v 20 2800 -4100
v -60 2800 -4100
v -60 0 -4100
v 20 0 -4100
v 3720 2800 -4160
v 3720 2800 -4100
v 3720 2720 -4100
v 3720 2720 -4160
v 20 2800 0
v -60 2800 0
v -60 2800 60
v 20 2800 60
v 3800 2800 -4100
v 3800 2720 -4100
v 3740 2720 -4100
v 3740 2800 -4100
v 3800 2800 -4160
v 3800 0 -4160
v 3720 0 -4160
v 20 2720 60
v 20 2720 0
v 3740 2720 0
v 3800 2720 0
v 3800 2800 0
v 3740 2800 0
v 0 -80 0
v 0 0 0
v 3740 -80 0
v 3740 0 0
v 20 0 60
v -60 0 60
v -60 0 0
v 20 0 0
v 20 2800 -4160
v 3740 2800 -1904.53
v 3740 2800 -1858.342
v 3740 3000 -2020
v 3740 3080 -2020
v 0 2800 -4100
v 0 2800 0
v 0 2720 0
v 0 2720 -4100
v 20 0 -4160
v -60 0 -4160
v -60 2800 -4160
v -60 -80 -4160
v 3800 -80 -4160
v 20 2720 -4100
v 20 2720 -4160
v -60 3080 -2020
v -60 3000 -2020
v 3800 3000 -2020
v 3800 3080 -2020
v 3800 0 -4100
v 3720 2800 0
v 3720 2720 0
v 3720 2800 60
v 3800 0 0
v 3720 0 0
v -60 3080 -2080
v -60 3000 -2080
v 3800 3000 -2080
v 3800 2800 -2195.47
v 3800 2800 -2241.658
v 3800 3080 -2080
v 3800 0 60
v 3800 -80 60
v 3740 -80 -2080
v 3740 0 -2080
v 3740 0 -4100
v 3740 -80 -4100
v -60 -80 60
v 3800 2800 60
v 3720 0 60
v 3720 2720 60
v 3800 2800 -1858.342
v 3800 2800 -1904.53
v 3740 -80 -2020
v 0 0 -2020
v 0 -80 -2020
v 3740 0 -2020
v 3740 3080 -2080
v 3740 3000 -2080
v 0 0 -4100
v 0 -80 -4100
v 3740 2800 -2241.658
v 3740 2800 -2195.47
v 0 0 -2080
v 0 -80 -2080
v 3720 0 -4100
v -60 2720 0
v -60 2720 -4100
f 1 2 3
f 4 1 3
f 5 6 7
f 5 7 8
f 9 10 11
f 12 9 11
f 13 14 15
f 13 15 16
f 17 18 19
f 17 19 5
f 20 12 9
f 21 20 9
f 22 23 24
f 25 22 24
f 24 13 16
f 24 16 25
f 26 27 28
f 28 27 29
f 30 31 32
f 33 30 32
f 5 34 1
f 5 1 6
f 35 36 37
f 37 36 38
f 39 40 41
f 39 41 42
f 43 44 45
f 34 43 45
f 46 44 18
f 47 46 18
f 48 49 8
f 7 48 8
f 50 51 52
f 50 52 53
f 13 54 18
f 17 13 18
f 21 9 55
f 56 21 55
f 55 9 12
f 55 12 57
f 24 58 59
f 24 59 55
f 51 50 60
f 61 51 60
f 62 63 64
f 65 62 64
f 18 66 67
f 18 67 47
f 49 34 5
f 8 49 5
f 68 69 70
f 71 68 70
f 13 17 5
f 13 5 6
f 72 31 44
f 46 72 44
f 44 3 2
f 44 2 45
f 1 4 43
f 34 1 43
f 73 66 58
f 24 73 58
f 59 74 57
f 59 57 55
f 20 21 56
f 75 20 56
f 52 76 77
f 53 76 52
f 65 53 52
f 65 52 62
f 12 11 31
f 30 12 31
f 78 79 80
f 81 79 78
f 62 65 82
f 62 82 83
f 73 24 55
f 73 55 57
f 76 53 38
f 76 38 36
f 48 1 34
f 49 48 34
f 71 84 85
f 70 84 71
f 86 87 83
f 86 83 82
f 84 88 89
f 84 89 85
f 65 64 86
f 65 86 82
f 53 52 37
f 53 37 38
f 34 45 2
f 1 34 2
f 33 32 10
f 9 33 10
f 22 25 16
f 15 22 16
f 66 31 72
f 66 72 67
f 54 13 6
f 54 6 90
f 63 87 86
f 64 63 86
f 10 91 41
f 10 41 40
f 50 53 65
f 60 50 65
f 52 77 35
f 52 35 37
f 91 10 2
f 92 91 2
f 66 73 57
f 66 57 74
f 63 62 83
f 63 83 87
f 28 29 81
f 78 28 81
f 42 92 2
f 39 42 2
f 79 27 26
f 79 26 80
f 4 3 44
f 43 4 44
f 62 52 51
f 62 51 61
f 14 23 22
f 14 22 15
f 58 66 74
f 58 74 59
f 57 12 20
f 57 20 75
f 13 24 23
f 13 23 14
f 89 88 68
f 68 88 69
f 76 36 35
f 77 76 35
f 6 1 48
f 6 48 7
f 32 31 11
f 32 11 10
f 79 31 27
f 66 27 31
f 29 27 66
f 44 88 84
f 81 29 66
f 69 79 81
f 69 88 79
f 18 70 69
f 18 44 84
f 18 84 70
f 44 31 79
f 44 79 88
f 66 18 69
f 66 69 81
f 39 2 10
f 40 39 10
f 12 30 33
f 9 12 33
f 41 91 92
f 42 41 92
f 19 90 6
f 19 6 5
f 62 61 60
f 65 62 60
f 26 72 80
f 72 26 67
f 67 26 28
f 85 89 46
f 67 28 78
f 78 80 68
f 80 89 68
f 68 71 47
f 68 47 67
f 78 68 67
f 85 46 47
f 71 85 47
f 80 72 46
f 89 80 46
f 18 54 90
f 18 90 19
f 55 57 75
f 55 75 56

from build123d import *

# Parameters (mm, degrees)
METAL_FRAME_W          = 7720
METAL_FRAME_H          = 4220
METAL_FRAME_W_2        = 7600
METAL_FRAME_H_2        = 2020
METALFRAME_DEPTH       = 80
SKETCH18_W             = 4667.943298929
SKETCH18_H             = 6508.190176391
CUT_EXTRUDE1_DEPTH     = 8718.086669295
SKETCH19_W             = 60
SKETCH19_H             = 4100
BOSS_EXTRUDE1_DEPTH    = 80
BOSS_EXTRUDE5_DEPTH    = 80
BOSS_EXTRUDE5_2_DEPTH  = 80
SKETCH23_3_W           = 2050
SKETCH23_3_H           = 80
BOSS_EXTRUDE6_DEPTH    = 60
BOSS_EXTRUDE7_START    = 3860
BOSS_EXTRUDE7_DEPTH    = 80
BOSS_EXTRUDE7_2_DEPTH  = 80
BOSS_EXTRUDE8_START    = 3860
SKETCH23_6_W           = 2050
SKETCH23_6_H           = 80
BOSS_EXTRUDE8_DEPTH    = 60
SKETCH24_W             = 3700
SKETCH24_H             = 60
BOSS_EXTRUDE9_DEPTH    = 80
BOSS_EXTRUDE9_2_DEPTH  = 80
BOSS_EXTRUDE10_DEPTH   = 60
BOSS_EXTRUDE10_2_DEPTH = 60
SKETCH25_3_W           = 60
SKETCH25_3_H           = 80
BOSS_EXTRUDE11_DEPTH   = 3860


with BuildPart() as part:
    # Metal frame → MetalFrame (new body)
    with BuildSketch(Plane(origin=(0, 0, 0), x_dir=(1, 0, 0), z_dir=(0, 1, 0))):
        with Locations((3800, 2050)):
            Rectangle(METAL_FRAME_W, METAL_FRAME_H)
        with Locations((3800, 1010)):
            Rectangle(METAL_FRAME_W_2, METAL_FRAME_H_2, mode=Mode.SUBTRACT)
        with Locations((3800, 3090)):
            Rectangle(METAL_FRAME_W_2, METAL_FRAME_H_2, mode=Mode.SUBTRACT)
    extrude(amount=-METALFRAME_DEPTH)

    # Sketch18 → Cut-Extrude1 (cut, through all)
    with BuildSketch(Plane(origin=(0, 0, 0), x_dir=(1, 0, 0), z_dir=(0, 1, 0))):
        with Locations((6133.971649464, 2239.218210402)):
            Rectangle(SKETCH18_W, SKETCH18_H)
    extrude(amount=-CUT_EXTRUDE1_DEPTH, mode=Mode.SUBTRACT)

    # Sketch19 → Boss-Extrude1 (add)
    with BuildSketch(Plane(origin=(0, 0, 0), x_dir=(1, 0, 0), z_dir=(0, 1, 0))):
        with Locations((3770, 2050)):
            Rectangle(SKETCH19_W, SKETCH19_H)
    extrude(amount=-BOSS_EXTRUDE1_DEPTH)


with BuildPart() as body_2:
    # Sketch23 → Boss-Extrude5 (new body)
    with BuildSketch(Plane(origin=(-60, 0, 0), x_dir=(0, 0, -1), z_dir=(1, 0, 0))):
        Polygon((4100, 0), (4160, 0), (4160, 2800), (4100, 2800), (4100, 2720), align=None)
    extrude(amount=BOSS_EXTRUDE5_DEPTH)


with BuildPart() as body_3:
    # Sketch23 → Boss-Extrude5 2 (new body)
    with BuildSketch(Plane(origin=(-60, 0, 0), x_dir=(0, 0, -1), z_dir=(1, 0, 0))):
        Polygon((-60, 0), (0, 0), (0, 2720), (0, 2800), (-60, 2800), align=None)
    extrude(amount=BOSS_EXTRUDE5_2_DEPTH)


with BuildPart() as body_4:
    # Sketch23<3> → Boss-Extrude6 (new body)
    with BuildSketch(Plane(origin=(-60, 0, 0), x_dir=(0, 0, -1), z_dir=(1, 0, 0))):
        with Locations((1025, 2760)):
            Rectangle(SKETCH23_3_W, SKETCH23_3_H)
        with Locations((3075, 2760)):
            Rectangle(SKETCH23_3_W, SKETCH23_3_H)
    extrude(amount=BOSS_EXTRUDE6_DEPTH)


with BuildPart() as body_5:
    # Sketch23<5> → Boss-Extrude7 (new body)
    with BuildSketch(Plane(origin=(-60, 0, 0), x_dir=(0, 0, -1), z_dir=(1, 0, 0)).offset(BOSS_EXTRUDE7_START)):
        Polygon((4100, 0), (4160, 0), (4160, 2800), (4100, 2800), (4100, 2720), align=None)
    extrude(amount=-BOSS_EXTRUDE7_DEPTH)


with BuildPart() as body_6:
    # Sketch23<5> → Boss-Extrude7 2 (new body)
    with BuildSketch(Plane(origin=(-60, 0, 0), x_dir=(0, 0, -1), z_dir=(1, 0, 0)).offset(BOSS_EXTRUDE7_START)):
        Polygon((-60, 0), (0, 0), (0, 2720), (0, 2800), (-60, 2800), align=None)
    extrude(amount=-BOSS_EXTRUDE7_2_DEPTH)


with BuildPart() as body_7:
    # Sketch23<6> → Boss-Extrude8 (new body)
    with BuildSketch(Plane(origin=(-60, 0, 0), x_dir=(0, 0, -1), z_dir=(1, 0, 0)).offset(BOSS_EXTRUDE8_START)):
        with Locations((3075, 2760)):
            Rectangle(SKETCH23_6_W, SKETCH23_6_H)
        with Locations((1025, 2760)):
            Rectangle(SKETCH23_6_W, SKETCH23_6_H)
    extrude(amount=-BOSS_EXTRUDE8_DEPTH)


with BuildPart() as body_8:
    # Sketch24 → Boss-Extrude9 (new body)
    with BuildSketch(Plane(origin=(0, 2800, 0), x_dir=(1, 0, 0), z_dir=(0, 1, 0))):
        with Locations((1870, 4130)):
            Rectangle(SKETCH24_W, SKETCH24_H)
    extrude(amount=-BOSS_EXTRUDE9_DEPTH)


with BuildPart() as body_9:
    # Sketch24 → Boss-Extrude9 2 (new body)
    with BuildSketch(Plane(origin=(0, 2800, 0), x_dir=(1, 0, 0), z_dir=(0, 1, 0))):
        with Locations((1870, -30)):
            Rectangle(SKETCH24_W, SKETCH24_H)
    extrude(amount=-BOSS_EXTRUDE9_2_DEPTH)


with BuildPart() as body_10:
    # Sketch25 → Boss-Extrude10 (new body)
    with BuildSketch(Plane(origin=(3800, 0, 0), x_dir=(0, 0, -1), z_dir=(1, 0, 0))):
        Polygon((2020, 3000), (2020, 3080), (1858.341924627, 2800), (1904.529946162, 2800), align=None)
    extrude(amount=-BOSS_EXTRUDE10_DEPTH)


with BuildPart() as body_11:
    # Sketch25 → Boss-Extrude10 2 (new body)
    with BuildSketch(Plane(origin=(3800, 0, 0), x_dir=(0, 0, -1), z_dir=(1, 0, 0))):
        Polygon((2241.658075373, 2800), (2080, 3080), (2080, 3000), (2195.470053838, 2800), align=None)
    extrude(amount=-BOSS_EXTRUDE10_2_DEPTH)


with BuildPart() as body_12:
    # Sketch25<3> → Boss-Extrude11 (new body)
    with BuildSketch(Plane(origin=(3800, 0, 0), x_dir=(0, 0, -1), z_dir=(1, 0, 0))):
        with Locations((2050, 3040)):
            Rectangle(SKETCH25_3_W, SKETCH25_3_H)
    extrude(amount=-BOSS_EXTRUDE11_DEPTH)


solid = Compound([part.part, body_2.part, body_3.part, body_4.part, body_5.part, body_6.part, body_7.part, body_8.part, body_9.part, body_10.part, body_11.part, body_12.part])
